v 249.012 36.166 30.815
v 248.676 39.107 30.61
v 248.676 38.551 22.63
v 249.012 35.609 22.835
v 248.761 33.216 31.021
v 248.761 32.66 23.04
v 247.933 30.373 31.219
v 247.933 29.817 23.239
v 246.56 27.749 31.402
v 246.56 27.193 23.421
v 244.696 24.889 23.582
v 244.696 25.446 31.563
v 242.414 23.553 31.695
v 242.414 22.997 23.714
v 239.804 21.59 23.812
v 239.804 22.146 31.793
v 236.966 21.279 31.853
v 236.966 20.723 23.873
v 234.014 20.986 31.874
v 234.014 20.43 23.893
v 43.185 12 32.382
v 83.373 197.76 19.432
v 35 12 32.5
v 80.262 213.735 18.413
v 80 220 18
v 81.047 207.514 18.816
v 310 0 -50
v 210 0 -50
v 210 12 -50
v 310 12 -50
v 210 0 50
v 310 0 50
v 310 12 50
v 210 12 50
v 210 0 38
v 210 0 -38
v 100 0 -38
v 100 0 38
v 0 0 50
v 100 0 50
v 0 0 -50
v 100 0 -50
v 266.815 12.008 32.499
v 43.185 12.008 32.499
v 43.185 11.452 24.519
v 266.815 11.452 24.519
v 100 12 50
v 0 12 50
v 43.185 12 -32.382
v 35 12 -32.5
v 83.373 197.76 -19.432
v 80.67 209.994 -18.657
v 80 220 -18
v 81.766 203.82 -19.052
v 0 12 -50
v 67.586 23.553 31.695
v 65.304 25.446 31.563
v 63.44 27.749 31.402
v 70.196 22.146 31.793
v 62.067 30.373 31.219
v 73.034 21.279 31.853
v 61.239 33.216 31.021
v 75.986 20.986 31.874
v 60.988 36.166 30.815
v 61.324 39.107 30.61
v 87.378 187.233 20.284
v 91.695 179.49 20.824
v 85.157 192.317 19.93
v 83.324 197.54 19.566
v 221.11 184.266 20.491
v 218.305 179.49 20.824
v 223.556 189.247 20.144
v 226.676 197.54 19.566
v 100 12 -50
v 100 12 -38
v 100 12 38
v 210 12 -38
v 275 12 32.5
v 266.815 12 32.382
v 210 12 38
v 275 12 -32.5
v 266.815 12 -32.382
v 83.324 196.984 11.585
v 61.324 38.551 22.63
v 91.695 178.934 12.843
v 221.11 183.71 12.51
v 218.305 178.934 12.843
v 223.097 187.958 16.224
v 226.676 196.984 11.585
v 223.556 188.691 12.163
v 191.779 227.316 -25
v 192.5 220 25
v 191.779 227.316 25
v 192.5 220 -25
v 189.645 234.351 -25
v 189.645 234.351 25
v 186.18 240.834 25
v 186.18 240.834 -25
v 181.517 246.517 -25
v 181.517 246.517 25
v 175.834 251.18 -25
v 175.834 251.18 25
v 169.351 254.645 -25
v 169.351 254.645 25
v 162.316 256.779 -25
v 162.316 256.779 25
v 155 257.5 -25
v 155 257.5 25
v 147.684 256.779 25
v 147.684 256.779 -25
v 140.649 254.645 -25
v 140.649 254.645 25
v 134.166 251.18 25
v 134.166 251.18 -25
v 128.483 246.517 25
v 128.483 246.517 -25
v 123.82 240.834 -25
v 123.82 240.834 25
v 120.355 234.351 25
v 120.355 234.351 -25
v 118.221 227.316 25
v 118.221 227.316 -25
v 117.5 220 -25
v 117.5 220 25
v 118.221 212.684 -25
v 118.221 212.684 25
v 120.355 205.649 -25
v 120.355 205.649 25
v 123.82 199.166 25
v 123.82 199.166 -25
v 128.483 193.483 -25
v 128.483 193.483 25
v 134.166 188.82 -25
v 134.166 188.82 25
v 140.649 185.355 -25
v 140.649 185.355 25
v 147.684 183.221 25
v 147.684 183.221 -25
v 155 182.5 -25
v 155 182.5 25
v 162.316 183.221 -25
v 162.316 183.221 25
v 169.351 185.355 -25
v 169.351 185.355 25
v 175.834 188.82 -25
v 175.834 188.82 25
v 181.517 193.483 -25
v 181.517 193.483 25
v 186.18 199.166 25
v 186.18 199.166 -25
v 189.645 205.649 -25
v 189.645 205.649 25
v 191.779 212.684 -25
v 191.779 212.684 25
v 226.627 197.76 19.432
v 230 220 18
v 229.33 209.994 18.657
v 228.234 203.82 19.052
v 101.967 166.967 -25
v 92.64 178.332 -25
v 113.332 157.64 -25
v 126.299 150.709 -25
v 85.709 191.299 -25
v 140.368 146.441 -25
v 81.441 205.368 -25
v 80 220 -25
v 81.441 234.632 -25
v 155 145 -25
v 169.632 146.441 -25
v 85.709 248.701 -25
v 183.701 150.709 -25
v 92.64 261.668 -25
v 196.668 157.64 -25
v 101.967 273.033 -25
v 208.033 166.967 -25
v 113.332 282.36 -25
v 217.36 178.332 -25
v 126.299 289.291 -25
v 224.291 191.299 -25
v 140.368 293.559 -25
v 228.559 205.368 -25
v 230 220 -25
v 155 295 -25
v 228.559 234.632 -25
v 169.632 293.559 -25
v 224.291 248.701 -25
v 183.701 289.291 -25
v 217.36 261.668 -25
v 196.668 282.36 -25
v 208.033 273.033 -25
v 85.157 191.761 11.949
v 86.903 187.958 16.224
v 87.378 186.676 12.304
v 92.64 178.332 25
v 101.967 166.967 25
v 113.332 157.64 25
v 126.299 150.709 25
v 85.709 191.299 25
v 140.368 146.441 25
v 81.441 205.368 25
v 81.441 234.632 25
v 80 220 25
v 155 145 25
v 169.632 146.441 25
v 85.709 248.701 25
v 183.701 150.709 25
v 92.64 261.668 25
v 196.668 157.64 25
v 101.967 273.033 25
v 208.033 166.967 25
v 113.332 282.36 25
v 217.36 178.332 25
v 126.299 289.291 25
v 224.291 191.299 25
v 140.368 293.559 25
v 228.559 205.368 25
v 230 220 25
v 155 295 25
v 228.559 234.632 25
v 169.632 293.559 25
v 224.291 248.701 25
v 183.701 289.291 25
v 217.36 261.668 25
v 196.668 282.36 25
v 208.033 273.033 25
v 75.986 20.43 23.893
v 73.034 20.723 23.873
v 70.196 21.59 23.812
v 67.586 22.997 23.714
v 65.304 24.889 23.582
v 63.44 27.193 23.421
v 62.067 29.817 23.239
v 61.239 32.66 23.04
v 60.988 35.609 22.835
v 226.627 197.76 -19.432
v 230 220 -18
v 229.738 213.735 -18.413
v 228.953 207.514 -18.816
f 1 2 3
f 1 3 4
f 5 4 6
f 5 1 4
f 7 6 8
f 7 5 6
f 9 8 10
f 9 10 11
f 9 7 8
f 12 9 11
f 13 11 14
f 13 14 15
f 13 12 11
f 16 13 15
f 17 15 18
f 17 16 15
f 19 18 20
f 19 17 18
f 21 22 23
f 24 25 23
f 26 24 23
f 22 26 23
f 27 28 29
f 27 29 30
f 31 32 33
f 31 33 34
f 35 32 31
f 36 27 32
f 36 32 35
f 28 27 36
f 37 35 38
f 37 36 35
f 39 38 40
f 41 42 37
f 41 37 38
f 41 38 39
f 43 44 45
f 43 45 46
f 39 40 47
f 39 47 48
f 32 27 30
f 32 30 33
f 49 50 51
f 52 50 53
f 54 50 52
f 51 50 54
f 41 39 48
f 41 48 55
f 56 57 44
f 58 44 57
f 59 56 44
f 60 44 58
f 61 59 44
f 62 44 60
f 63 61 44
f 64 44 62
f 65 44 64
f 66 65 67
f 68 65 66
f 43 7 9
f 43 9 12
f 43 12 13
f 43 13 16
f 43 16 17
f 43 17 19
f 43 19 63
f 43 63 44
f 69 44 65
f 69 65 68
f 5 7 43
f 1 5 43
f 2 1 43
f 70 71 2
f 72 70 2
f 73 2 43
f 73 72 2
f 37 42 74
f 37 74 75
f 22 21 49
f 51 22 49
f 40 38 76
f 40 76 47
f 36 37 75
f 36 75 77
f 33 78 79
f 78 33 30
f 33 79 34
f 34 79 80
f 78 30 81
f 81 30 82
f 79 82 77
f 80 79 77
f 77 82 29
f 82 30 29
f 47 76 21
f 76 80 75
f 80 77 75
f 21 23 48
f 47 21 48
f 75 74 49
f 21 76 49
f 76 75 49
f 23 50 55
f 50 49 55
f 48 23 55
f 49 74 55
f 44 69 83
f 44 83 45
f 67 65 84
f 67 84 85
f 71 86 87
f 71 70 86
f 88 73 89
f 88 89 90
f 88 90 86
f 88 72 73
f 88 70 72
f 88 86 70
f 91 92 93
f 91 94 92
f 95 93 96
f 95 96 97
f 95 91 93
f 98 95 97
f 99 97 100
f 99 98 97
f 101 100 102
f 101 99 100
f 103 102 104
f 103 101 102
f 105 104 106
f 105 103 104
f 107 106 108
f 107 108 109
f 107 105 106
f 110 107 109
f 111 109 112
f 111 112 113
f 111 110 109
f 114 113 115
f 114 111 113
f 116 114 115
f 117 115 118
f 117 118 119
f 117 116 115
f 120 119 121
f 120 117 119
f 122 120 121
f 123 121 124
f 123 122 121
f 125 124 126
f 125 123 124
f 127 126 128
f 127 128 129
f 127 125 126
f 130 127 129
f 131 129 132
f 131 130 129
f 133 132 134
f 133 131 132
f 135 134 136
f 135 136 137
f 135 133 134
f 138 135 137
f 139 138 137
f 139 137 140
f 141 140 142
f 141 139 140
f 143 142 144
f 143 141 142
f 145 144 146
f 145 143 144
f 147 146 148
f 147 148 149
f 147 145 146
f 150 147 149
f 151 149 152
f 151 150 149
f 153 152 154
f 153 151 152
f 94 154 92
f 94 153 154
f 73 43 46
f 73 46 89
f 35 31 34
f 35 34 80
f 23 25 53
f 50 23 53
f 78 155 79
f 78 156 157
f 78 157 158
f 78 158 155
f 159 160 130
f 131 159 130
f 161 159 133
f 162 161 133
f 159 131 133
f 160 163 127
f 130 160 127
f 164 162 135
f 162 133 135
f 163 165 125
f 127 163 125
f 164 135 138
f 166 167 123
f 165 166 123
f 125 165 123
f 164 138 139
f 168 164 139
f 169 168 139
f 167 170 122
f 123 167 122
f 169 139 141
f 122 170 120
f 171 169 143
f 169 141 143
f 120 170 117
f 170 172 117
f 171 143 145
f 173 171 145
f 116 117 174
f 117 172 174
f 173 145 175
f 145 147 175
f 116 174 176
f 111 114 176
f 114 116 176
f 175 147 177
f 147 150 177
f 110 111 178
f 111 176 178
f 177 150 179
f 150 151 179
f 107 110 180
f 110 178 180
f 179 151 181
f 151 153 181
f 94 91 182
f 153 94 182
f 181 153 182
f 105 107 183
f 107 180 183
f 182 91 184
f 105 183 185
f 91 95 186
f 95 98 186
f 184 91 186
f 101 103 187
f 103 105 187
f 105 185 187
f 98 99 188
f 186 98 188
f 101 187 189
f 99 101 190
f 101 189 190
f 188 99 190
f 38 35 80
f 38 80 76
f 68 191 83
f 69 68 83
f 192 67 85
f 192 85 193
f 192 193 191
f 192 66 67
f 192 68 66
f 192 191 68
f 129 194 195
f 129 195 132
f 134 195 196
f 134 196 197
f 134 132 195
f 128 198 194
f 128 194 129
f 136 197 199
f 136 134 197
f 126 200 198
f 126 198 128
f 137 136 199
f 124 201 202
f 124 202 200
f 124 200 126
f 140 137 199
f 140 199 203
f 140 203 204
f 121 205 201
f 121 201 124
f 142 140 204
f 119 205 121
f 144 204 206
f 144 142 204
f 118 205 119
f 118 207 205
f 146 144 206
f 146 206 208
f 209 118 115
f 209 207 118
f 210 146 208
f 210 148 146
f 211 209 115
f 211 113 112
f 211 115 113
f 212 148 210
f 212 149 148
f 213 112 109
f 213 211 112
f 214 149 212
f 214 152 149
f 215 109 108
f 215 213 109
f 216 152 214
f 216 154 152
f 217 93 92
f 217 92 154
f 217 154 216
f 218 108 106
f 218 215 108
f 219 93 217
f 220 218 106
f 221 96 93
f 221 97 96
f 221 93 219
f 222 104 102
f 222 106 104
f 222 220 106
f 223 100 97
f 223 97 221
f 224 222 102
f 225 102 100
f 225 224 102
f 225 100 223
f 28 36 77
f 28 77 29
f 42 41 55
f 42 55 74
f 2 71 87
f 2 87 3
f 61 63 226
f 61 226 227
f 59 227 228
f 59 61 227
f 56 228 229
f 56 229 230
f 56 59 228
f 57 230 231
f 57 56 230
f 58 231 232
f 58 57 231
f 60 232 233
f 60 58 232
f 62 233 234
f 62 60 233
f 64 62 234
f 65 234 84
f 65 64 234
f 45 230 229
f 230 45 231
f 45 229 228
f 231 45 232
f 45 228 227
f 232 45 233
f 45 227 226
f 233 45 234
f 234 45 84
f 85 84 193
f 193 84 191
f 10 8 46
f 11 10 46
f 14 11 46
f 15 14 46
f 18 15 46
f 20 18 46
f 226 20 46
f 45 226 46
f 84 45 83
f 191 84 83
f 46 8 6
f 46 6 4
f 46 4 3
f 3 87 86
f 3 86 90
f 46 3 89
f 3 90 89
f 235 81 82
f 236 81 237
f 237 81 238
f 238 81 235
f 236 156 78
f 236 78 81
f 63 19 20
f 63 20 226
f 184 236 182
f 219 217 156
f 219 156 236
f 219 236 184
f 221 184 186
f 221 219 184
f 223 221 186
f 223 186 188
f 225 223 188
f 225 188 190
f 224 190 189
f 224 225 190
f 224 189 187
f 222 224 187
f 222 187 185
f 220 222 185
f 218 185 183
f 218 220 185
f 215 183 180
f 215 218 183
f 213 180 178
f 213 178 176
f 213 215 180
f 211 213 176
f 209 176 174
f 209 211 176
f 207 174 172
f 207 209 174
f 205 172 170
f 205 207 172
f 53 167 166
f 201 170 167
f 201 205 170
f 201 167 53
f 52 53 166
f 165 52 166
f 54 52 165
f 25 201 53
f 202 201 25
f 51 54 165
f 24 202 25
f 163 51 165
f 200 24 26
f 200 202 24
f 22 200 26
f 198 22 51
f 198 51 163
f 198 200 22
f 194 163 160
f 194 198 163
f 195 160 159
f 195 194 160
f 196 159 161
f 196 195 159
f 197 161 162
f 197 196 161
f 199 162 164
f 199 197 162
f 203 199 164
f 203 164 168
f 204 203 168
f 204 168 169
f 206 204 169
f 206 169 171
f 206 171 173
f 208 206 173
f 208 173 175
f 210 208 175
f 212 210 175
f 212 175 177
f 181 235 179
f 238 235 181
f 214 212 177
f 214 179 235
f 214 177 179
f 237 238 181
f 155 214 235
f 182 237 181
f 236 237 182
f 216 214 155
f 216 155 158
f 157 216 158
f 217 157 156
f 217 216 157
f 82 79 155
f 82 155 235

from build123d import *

# Parameters (mm, degrees)
BOSS_EXTRUDE1_DEPTH  = 12
SKETCH2_R            = 75
SKETCH2_R_2          = 37.5
BOSS_EXTRUDE2_DEPTH  = 25
BOSS_EXTRUDE3_DEPTH  = 8
BOSS_EXTRUDE11_DEPTH = 8


with BuildPart() as part:
    # Sketch1 → Boss-Extrude1 (new body)
    with BuildSketch(Plane(origin=(0, 0, 0), x_dir=(1, 0, 0), z_dir=(0, 1, 0))):
        Polygon((0, -50), (0, 50), (100, 50), (100, 38), (210, 38), (210, 50), (310, 50), (310, -50), (210, -50), (210, -38), (100, -38), (100, -50), align=None)
    extrude(amount=BOSS_EXTRUDE1_DEPTH)



with BuildPart() as body_2:
    # Sketch2 → Boss-Extrude2 (new body, symmetric)
    with BuildSketch(Plane.XY):
        with Locations((155, 220)):
            Circle(SKETCH2_R)
        with Locations((155, 220)):
            Circle(SKETCH2_R_2, mode=Mode.SUBTRACT)
    extrude(amount=BOSS_EXTRUDE2_DEPTH, both=True)


with BuildPart() as part_1:
    add(part.part)

    add(body_2.part)  # Boss-Extrude3 merges body 2
    # Sketch6 → Boss-Extrude3 (add)
    with BuildSketch(Plane(origin=(30.95497803, -6.696990439, 0), x_dir=(0, 0, -1), z_dir=(0.977387925, -0.211454118, 0))):
        Polygon((18, 231.941672957), (-18, 231.941672957), (-32.5, 19.129549242), (32.5, 19.129549242), align=None)
    boss_extrude3 = extrude(amount=BOSS_EXTRUDE3_DEPTH)

    # Mirror2: Boss-Extrude3 across plane
    add(boss_extrude3.mirror(Plane(origin=(155, 0, 0), x_dir=(0, 0, 1), z_dir=(1, 0, 0))))


with BuildPart() as body_2_2:
    # Sketch7 → Boss-Extrude11 (new body)
    with BuildSketch(Plane(origin=(0, 2.312702347, 33.175316423), x_dir=(-1, 0, 0), z_dir=(0, -0.069542765, -0.997578971))):
        with BuildLine():
            Line((-83.324181623, 195.701116483), (-43.185081681, 9.719008722))
            Line((-43.185081681, 9.719008722), (-266.814918319, 9.719008722))
            Line((-266.814918319, 9.719008722), (-226.675818377, 195.701116483))
            add(Edge.make_bspline(
                [(-226.675818377, 195.701116483), (-223.708746902, 186.093264091), (-218.304519789, 177.60755028)],
                knots=[0.298843639, 0.298843639, 0.298843639, 0.565986011, 0.565986011, 0.565986011], degree=2, weights=[1, 0.991092624, 1]))
            Line((-218.304519789, 177.60755028), (-248.675921878, 36.883483611))
            ThreePointArc((-248.675921878, 36.883483611), (-245.685430986, 24.297414465), (-234.013517618, 18.719008722))
            Line((-234.013517618, 18.719008722), (-75.986482382, 18.719008722))
            ThreePointArc((-75.986482382, 18.719008722), (-64.314569014, 24.297414465), (-61.324078122, 36.883483611))
            Line((-61.324078122, 36.883483611), (-91.695480211, 177.60755028))
            add(Edge.make_bspline(
                [(-91.695480211, 177.60755028), (-86.291253098, 186.093264091), (-83.324181623, 195.701116483)],
                knots=[5.717199296, 5.717199296, 5.717199296, 5.984341668, 5.984341668, 5.984341668], degree=2, weights=[1, 0.991092624, 1]))
        make_face()
    extrude(amount=BOSS_EXTRUDE11_DEPTH)


solid = Compound([part_1.part, body_2_2.part])
